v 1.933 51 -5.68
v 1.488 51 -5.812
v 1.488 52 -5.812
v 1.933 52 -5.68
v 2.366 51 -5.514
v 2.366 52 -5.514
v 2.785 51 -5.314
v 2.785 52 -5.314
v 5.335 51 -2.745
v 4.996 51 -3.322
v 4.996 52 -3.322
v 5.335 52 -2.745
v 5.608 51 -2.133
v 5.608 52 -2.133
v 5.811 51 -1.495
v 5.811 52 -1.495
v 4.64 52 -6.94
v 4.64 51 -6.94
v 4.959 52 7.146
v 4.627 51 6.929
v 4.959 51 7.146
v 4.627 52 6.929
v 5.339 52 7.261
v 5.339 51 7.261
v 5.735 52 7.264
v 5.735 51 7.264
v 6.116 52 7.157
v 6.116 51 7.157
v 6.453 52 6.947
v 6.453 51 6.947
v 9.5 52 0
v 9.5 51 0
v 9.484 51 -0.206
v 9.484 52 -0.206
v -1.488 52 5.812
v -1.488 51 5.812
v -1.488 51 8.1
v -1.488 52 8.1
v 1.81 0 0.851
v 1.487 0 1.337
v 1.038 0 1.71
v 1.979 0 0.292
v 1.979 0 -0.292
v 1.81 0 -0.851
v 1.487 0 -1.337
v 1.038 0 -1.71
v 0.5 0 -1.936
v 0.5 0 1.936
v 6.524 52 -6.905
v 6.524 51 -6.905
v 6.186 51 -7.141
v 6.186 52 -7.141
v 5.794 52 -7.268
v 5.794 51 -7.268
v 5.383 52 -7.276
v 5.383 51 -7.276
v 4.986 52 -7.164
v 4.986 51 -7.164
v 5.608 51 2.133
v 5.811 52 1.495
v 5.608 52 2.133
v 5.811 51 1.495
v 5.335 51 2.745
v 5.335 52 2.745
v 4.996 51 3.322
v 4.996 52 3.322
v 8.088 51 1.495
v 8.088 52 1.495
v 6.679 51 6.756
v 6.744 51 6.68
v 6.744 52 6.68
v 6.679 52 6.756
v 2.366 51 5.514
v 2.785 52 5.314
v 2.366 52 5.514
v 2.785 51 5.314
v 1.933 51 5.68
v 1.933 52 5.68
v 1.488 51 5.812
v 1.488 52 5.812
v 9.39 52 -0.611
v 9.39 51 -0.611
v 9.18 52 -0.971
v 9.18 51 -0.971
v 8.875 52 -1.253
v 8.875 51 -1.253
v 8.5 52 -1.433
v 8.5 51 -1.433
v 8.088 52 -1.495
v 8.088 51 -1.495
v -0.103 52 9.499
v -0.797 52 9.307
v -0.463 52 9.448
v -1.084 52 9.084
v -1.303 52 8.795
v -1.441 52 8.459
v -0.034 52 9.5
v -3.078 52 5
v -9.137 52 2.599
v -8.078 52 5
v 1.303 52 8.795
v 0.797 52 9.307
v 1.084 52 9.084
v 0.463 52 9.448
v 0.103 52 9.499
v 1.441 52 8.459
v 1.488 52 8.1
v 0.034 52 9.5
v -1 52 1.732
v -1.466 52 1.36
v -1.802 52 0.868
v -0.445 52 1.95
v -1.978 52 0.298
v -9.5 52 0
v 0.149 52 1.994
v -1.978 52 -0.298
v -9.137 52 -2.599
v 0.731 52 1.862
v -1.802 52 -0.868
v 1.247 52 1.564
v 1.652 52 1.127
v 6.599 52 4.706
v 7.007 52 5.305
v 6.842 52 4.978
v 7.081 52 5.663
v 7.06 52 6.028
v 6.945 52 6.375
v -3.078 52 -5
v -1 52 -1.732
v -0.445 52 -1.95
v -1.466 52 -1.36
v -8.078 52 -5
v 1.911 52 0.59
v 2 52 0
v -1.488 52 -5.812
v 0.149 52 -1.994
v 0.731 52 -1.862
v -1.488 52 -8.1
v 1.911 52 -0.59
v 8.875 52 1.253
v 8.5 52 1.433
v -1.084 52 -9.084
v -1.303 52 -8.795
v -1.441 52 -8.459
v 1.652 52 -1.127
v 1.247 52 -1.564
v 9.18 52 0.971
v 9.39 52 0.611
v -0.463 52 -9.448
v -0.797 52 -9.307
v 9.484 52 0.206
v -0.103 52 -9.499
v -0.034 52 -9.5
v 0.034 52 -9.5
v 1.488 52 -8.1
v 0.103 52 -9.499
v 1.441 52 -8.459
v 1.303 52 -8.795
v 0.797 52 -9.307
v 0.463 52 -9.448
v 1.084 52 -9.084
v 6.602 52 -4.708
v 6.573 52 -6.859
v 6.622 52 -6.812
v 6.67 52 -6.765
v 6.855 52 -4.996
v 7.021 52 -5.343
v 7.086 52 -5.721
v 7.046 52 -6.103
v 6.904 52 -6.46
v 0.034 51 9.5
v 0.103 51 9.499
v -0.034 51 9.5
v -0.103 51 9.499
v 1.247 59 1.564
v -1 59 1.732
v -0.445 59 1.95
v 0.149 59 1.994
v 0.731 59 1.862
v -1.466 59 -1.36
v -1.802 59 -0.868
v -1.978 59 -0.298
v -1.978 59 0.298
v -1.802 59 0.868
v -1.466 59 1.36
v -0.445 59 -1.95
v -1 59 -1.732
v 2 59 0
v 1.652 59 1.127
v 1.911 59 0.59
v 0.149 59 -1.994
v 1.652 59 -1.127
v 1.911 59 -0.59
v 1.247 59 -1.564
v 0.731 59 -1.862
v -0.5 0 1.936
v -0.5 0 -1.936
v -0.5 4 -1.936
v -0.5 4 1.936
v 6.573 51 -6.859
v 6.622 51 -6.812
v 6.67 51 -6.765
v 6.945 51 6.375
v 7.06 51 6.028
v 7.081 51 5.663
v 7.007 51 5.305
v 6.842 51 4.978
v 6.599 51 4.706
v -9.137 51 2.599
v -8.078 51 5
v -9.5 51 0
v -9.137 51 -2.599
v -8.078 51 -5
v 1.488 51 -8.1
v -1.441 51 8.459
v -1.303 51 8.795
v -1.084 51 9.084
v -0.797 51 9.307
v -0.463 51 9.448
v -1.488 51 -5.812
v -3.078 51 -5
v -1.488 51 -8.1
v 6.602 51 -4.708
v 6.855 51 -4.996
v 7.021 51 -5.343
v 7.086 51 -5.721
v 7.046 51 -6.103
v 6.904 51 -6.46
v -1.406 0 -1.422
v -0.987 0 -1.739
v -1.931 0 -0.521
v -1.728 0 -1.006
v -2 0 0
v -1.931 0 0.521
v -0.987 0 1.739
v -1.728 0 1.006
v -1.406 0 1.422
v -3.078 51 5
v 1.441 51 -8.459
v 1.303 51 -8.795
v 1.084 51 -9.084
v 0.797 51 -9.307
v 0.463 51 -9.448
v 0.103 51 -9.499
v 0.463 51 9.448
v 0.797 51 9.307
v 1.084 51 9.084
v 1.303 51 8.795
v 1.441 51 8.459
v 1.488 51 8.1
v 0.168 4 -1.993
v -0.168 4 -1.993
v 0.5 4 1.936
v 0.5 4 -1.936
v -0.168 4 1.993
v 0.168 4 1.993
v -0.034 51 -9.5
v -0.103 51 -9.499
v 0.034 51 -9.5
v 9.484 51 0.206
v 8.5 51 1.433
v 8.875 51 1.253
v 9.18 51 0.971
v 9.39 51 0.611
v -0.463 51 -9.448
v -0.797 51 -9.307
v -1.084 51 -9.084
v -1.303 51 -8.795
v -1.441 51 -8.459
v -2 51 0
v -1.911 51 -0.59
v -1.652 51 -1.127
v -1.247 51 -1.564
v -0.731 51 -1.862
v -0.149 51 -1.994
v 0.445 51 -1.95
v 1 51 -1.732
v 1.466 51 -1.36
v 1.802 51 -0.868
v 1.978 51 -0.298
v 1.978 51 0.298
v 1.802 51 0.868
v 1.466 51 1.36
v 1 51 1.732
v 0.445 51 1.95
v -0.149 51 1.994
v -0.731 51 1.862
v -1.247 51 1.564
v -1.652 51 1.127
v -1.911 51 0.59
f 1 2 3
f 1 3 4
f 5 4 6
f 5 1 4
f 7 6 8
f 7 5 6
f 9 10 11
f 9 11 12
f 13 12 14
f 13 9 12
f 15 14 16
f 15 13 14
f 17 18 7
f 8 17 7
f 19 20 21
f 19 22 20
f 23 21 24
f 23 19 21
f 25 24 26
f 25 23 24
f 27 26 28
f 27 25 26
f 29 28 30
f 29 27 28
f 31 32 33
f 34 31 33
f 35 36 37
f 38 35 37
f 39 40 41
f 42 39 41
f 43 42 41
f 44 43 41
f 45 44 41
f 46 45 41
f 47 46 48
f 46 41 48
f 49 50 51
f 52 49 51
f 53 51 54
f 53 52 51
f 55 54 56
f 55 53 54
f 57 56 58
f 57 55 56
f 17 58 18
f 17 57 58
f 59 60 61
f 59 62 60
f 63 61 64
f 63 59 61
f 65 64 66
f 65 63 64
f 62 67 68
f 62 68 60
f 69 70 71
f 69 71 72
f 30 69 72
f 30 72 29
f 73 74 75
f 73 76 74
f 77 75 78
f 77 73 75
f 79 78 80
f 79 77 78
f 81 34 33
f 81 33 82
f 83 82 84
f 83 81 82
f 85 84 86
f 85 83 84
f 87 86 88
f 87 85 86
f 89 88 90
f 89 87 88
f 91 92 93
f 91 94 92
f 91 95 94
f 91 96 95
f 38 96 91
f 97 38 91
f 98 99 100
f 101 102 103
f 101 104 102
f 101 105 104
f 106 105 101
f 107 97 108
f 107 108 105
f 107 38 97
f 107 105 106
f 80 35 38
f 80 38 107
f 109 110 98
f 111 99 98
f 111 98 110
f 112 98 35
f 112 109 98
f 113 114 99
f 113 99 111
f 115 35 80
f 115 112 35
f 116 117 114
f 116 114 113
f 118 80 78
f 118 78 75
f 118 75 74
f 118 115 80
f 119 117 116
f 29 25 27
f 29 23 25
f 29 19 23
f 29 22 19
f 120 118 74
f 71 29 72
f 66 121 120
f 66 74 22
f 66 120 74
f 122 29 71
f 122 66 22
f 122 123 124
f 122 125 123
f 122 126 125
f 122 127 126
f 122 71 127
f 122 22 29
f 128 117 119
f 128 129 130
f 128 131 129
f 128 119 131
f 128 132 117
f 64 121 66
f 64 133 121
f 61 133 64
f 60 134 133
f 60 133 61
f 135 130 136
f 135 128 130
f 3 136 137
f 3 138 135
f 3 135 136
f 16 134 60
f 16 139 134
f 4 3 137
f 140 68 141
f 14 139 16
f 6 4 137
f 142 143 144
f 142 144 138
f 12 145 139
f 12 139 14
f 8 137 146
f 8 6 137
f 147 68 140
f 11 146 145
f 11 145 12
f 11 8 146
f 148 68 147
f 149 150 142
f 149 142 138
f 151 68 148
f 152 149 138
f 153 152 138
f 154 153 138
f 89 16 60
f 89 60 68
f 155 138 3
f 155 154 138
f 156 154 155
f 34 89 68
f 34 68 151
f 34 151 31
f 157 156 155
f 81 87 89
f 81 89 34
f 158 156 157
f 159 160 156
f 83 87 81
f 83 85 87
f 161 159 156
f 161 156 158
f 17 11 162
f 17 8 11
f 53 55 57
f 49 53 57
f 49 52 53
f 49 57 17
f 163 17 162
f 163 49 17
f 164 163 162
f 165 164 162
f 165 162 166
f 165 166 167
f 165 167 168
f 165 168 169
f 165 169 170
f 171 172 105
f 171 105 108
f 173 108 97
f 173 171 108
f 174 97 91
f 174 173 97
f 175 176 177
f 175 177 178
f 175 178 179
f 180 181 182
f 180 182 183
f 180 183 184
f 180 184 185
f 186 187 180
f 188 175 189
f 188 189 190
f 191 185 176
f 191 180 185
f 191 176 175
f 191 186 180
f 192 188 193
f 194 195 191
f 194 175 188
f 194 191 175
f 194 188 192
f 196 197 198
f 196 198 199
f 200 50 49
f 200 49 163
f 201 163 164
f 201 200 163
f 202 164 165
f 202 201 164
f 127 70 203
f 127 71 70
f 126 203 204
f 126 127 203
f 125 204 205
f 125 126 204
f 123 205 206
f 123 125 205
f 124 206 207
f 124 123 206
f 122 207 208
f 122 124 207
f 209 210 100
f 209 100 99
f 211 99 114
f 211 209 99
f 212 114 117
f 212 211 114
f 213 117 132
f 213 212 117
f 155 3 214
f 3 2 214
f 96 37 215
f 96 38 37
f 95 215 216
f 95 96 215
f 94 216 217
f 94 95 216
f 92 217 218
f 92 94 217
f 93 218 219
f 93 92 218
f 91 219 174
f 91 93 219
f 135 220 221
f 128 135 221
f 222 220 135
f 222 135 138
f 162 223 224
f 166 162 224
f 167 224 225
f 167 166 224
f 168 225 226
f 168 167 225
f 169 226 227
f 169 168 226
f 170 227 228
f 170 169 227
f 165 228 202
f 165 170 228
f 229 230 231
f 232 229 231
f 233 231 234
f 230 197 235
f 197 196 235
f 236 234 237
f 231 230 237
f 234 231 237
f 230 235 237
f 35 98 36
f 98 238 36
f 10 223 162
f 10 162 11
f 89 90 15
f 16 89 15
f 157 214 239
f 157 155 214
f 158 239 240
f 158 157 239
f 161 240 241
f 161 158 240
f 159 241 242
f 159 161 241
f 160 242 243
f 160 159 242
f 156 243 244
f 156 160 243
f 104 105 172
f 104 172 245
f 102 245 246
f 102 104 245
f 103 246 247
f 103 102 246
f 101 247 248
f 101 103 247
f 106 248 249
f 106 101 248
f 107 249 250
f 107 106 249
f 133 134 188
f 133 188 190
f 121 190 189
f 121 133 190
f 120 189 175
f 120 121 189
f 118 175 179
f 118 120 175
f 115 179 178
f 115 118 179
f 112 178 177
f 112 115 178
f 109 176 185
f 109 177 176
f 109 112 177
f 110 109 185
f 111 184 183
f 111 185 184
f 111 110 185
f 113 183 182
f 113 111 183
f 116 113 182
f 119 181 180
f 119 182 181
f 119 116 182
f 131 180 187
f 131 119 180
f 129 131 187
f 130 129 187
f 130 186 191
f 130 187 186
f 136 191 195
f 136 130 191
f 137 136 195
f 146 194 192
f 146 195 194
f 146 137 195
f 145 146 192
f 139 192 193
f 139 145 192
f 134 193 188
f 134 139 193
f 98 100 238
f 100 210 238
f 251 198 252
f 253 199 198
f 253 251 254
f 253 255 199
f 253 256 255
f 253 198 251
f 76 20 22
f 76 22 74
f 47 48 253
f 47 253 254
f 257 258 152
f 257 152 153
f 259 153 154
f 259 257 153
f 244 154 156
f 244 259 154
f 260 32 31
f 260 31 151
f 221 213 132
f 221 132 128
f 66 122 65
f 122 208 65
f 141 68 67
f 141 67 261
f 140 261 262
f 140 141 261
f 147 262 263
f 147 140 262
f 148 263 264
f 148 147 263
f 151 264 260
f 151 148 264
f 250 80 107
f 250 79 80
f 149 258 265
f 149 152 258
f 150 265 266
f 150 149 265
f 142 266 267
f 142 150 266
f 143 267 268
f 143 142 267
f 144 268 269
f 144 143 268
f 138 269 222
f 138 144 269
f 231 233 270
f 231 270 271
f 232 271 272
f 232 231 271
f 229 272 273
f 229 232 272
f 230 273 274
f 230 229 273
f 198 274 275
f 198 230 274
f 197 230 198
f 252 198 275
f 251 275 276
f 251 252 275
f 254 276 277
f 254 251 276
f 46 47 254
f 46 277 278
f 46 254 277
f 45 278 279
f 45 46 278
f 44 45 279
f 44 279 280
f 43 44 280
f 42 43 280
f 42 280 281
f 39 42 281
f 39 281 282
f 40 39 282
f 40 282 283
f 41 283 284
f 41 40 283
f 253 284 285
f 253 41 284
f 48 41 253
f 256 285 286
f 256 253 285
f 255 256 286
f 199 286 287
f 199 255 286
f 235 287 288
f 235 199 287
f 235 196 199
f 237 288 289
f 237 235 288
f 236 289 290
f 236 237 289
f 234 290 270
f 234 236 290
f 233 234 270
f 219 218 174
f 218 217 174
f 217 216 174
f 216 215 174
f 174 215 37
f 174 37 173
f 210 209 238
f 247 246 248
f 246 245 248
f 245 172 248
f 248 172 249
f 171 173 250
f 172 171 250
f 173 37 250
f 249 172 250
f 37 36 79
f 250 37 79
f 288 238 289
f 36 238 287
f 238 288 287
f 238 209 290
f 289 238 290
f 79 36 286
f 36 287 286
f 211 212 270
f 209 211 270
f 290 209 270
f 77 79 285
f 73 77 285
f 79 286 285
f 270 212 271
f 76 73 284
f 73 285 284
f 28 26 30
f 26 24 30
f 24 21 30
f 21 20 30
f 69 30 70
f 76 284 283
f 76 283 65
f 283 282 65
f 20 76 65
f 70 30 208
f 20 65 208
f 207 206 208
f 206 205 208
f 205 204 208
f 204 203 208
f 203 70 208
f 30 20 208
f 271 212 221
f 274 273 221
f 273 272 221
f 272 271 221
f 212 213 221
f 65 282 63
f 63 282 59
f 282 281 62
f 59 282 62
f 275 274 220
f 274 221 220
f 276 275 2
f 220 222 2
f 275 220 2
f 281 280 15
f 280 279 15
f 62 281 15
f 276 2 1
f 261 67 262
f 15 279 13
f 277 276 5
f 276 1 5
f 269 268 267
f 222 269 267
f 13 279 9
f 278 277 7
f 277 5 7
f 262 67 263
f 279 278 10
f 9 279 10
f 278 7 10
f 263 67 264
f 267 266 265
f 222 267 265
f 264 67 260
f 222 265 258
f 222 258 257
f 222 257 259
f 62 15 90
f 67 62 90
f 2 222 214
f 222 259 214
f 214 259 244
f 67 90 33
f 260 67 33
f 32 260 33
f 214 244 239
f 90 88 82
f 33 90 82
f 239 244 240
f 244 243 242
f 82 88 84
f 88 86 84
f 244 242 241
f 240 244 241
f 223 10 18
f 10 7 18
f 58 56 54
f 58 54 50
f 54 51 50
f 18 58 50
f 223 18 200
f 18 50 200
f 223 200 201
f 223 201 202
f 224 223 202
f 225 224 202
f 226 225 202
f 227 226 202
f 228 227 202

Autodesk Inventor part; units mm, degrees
ref_plane "YZ Plane" through (0, 0, 0) normal (1, 0, 0) x (0, 1, 0)
ref_plane "XZ Plane" through (0, 0, 0) normal (0, 1, 0) x (-1, 0, 0)
ref_plane "XY Plane" through (0, 0, 0) normal (0, 0, 1) x (1, 0, 0)
sketch "Sketch1" plane through (0, 0, 0) normal (0, 1, 0) x (-1, 0, 0)
  point P0 (0, 0)
sketch "Sketch2" plane through (0, 0, 0) normal (0, 1, 0) x (-1, 0, 0)
  circle A0 centre (0, 0) radius 2
  dimension "d0" = 4
extrude "Extrusion1" add sketch "Sketch2" along normal blind 51
sketch "Sketch3" plane through (0, 0, 0) normal (0, -1, 0) x (1, 0, 0)
  line L0 (-0.5, 2) -> (0.5, 2)
  line L1 (0.5, 2) -> (0.5, -2)
  line L2 (0.5, -2) -> (-0.5, -2)
  line L3 (-0.5, -2) -> (-0.5, 2)
  line L4 (-0.5, 2) -> (0.5, -2) construction
  line L5 (0.5, 2) -> (-0.5, -2) construction
  point P0 (0, 0)
  dimension "d3" = 1
  dimension "d4" = 4
extrude "Extrusion2" cut sketch "Sketch3" against normal blind 4
sketch "Sketch4" plane through (0, 51, 0) normal (0, 1, 0) x (1, 0, 0)
  line L0 (0, 9.5) -> (0, -9.5) construction
  line L1 (9.5, 0) -> (-9.5, 0) construction
  line L2 (9.5, 0) -> (9.3816, 1.4953)
  line L3 (9.3816, 1.4953) -> (5.8107, 1.4953)
  line L4 (9.5, 0) -> (9.3816, -1.4953)
  line L5 (9.3816, -1.4953) -> (5.8107, -1.4953)
  line L6 (1.4882, -5.8125) -> (1.4882, -9.3827)
  line L7 (-1.4882, -5.8125) -> (-1.4882, -9.3827)
  line L8 (1.4882, 5.8125) -> (1.4882, 9.3827)
  line L9 (-1.4882, 5.8125) -> (-1.4882, 9.3827)
  line L10 (7.659, -5.6204) -> (4.9964, -3.322)
  line L11 (7.659, -5.6204) -> (6.6789, -6.7559)
  line L12 (6.6789, -6.7559) -> (5.5323, -7.723)
  line L13 (5.5323, -7.723) -> (2.7851, -5.3144)
  line L14 (7.659, 5.6204) -> (4.9964, 3.322)
  line L15 (5.5323, 7.723) -> (2.7851, 5.3144)
  line L16 (-9.5, 0) -> (-9.5, 5) construction
  line L17 (-9.5, 0) -> (-9.5, -5) construction
  line L18 (-8.0777, 5) -> (-3.0777, 5)
  line L19 (-8.0777, -5) -> (-3.0777, -5)
  line L20 (-1.4882, 5.8125) -> (-3.0777, 5)
  line L21 (-3.0777, -5) -> (-1.4882, -5.8125)
  arc A0 (-8.0777, 5) -> (-8.0777, -5) centre (0, 0) ccw
  arc A1 (-1.4882, -9.3827) -> (1.4882, -9.3827) centre (0, 0) ccw
  arc A2 (5.5323, -7.723) -> (7.659, -5.6204) centre (0, 0) ccw
  arc A3 (9.3816, -1.4953) -> (9.3816, 1.4953) centre (0, 0) ccw
  arc A4 (7.659, 5.6204) -> (5.5323, 7.723) centre (0, 0) ccw
  arc A5 (1.4882, 9.3827) -> (-1.4882, 9.3827) centre (0, 0) ccw
  arc A6 (5.8107, 1.4953) -> (4.9964, 3.322) centre (0, 0) ccw
  arc A7 (4.9964, -3.322) -> (5.8107, -1.4953) centre (0, 0) ccw
  arc A8 (1.4882, -5.8125) -> (2.7851, -5.3144) centre (0, 0) ccw
  arc A9 (2.7851, 5.3144) -> (1.4882, 5.8125) centre (0, 0) ccw
  dimension "d28" = 5
  dimension "d29" = 5
extrude "Extrusion3" add sketch "Sketch4" along normal blind 1 contours L4 L5 A7 L10 L11 L12 L13 A8 L6 A1 L7 L21 L19 A0 L18 L20 L9 A5 L8 A9 L15 A4 L14 A6 L3 L2
fillet "Fillet1" radius 1.4 10 edges at (1.4882, 51.5, 9.3827) (-1.4882, 51.5, 9.3827) (9.3816, 51.5, 1.4953) (9.3816, 51.5, -1.4953) (7.659, 51.5, -5.6204) (5.5323, 51.5, -7.723) (1.4882, 51.5, -9.3827) (-1.4882, 51.5, -9.3827) (5.5323, 51.5, 7.723) (7.659, 51.5, 5.6204)
sketch "Sketch5" plane through (0, 52, 0) normal (0, 1, 0) x (1, 0, 0)
  circle A0 centre (0, 0) radius 2
  dimension "d33" = 4
extrude "Extrusion4" add sketch "Sketch5" along normal blind 7
properties part number "Main turning shaft"
